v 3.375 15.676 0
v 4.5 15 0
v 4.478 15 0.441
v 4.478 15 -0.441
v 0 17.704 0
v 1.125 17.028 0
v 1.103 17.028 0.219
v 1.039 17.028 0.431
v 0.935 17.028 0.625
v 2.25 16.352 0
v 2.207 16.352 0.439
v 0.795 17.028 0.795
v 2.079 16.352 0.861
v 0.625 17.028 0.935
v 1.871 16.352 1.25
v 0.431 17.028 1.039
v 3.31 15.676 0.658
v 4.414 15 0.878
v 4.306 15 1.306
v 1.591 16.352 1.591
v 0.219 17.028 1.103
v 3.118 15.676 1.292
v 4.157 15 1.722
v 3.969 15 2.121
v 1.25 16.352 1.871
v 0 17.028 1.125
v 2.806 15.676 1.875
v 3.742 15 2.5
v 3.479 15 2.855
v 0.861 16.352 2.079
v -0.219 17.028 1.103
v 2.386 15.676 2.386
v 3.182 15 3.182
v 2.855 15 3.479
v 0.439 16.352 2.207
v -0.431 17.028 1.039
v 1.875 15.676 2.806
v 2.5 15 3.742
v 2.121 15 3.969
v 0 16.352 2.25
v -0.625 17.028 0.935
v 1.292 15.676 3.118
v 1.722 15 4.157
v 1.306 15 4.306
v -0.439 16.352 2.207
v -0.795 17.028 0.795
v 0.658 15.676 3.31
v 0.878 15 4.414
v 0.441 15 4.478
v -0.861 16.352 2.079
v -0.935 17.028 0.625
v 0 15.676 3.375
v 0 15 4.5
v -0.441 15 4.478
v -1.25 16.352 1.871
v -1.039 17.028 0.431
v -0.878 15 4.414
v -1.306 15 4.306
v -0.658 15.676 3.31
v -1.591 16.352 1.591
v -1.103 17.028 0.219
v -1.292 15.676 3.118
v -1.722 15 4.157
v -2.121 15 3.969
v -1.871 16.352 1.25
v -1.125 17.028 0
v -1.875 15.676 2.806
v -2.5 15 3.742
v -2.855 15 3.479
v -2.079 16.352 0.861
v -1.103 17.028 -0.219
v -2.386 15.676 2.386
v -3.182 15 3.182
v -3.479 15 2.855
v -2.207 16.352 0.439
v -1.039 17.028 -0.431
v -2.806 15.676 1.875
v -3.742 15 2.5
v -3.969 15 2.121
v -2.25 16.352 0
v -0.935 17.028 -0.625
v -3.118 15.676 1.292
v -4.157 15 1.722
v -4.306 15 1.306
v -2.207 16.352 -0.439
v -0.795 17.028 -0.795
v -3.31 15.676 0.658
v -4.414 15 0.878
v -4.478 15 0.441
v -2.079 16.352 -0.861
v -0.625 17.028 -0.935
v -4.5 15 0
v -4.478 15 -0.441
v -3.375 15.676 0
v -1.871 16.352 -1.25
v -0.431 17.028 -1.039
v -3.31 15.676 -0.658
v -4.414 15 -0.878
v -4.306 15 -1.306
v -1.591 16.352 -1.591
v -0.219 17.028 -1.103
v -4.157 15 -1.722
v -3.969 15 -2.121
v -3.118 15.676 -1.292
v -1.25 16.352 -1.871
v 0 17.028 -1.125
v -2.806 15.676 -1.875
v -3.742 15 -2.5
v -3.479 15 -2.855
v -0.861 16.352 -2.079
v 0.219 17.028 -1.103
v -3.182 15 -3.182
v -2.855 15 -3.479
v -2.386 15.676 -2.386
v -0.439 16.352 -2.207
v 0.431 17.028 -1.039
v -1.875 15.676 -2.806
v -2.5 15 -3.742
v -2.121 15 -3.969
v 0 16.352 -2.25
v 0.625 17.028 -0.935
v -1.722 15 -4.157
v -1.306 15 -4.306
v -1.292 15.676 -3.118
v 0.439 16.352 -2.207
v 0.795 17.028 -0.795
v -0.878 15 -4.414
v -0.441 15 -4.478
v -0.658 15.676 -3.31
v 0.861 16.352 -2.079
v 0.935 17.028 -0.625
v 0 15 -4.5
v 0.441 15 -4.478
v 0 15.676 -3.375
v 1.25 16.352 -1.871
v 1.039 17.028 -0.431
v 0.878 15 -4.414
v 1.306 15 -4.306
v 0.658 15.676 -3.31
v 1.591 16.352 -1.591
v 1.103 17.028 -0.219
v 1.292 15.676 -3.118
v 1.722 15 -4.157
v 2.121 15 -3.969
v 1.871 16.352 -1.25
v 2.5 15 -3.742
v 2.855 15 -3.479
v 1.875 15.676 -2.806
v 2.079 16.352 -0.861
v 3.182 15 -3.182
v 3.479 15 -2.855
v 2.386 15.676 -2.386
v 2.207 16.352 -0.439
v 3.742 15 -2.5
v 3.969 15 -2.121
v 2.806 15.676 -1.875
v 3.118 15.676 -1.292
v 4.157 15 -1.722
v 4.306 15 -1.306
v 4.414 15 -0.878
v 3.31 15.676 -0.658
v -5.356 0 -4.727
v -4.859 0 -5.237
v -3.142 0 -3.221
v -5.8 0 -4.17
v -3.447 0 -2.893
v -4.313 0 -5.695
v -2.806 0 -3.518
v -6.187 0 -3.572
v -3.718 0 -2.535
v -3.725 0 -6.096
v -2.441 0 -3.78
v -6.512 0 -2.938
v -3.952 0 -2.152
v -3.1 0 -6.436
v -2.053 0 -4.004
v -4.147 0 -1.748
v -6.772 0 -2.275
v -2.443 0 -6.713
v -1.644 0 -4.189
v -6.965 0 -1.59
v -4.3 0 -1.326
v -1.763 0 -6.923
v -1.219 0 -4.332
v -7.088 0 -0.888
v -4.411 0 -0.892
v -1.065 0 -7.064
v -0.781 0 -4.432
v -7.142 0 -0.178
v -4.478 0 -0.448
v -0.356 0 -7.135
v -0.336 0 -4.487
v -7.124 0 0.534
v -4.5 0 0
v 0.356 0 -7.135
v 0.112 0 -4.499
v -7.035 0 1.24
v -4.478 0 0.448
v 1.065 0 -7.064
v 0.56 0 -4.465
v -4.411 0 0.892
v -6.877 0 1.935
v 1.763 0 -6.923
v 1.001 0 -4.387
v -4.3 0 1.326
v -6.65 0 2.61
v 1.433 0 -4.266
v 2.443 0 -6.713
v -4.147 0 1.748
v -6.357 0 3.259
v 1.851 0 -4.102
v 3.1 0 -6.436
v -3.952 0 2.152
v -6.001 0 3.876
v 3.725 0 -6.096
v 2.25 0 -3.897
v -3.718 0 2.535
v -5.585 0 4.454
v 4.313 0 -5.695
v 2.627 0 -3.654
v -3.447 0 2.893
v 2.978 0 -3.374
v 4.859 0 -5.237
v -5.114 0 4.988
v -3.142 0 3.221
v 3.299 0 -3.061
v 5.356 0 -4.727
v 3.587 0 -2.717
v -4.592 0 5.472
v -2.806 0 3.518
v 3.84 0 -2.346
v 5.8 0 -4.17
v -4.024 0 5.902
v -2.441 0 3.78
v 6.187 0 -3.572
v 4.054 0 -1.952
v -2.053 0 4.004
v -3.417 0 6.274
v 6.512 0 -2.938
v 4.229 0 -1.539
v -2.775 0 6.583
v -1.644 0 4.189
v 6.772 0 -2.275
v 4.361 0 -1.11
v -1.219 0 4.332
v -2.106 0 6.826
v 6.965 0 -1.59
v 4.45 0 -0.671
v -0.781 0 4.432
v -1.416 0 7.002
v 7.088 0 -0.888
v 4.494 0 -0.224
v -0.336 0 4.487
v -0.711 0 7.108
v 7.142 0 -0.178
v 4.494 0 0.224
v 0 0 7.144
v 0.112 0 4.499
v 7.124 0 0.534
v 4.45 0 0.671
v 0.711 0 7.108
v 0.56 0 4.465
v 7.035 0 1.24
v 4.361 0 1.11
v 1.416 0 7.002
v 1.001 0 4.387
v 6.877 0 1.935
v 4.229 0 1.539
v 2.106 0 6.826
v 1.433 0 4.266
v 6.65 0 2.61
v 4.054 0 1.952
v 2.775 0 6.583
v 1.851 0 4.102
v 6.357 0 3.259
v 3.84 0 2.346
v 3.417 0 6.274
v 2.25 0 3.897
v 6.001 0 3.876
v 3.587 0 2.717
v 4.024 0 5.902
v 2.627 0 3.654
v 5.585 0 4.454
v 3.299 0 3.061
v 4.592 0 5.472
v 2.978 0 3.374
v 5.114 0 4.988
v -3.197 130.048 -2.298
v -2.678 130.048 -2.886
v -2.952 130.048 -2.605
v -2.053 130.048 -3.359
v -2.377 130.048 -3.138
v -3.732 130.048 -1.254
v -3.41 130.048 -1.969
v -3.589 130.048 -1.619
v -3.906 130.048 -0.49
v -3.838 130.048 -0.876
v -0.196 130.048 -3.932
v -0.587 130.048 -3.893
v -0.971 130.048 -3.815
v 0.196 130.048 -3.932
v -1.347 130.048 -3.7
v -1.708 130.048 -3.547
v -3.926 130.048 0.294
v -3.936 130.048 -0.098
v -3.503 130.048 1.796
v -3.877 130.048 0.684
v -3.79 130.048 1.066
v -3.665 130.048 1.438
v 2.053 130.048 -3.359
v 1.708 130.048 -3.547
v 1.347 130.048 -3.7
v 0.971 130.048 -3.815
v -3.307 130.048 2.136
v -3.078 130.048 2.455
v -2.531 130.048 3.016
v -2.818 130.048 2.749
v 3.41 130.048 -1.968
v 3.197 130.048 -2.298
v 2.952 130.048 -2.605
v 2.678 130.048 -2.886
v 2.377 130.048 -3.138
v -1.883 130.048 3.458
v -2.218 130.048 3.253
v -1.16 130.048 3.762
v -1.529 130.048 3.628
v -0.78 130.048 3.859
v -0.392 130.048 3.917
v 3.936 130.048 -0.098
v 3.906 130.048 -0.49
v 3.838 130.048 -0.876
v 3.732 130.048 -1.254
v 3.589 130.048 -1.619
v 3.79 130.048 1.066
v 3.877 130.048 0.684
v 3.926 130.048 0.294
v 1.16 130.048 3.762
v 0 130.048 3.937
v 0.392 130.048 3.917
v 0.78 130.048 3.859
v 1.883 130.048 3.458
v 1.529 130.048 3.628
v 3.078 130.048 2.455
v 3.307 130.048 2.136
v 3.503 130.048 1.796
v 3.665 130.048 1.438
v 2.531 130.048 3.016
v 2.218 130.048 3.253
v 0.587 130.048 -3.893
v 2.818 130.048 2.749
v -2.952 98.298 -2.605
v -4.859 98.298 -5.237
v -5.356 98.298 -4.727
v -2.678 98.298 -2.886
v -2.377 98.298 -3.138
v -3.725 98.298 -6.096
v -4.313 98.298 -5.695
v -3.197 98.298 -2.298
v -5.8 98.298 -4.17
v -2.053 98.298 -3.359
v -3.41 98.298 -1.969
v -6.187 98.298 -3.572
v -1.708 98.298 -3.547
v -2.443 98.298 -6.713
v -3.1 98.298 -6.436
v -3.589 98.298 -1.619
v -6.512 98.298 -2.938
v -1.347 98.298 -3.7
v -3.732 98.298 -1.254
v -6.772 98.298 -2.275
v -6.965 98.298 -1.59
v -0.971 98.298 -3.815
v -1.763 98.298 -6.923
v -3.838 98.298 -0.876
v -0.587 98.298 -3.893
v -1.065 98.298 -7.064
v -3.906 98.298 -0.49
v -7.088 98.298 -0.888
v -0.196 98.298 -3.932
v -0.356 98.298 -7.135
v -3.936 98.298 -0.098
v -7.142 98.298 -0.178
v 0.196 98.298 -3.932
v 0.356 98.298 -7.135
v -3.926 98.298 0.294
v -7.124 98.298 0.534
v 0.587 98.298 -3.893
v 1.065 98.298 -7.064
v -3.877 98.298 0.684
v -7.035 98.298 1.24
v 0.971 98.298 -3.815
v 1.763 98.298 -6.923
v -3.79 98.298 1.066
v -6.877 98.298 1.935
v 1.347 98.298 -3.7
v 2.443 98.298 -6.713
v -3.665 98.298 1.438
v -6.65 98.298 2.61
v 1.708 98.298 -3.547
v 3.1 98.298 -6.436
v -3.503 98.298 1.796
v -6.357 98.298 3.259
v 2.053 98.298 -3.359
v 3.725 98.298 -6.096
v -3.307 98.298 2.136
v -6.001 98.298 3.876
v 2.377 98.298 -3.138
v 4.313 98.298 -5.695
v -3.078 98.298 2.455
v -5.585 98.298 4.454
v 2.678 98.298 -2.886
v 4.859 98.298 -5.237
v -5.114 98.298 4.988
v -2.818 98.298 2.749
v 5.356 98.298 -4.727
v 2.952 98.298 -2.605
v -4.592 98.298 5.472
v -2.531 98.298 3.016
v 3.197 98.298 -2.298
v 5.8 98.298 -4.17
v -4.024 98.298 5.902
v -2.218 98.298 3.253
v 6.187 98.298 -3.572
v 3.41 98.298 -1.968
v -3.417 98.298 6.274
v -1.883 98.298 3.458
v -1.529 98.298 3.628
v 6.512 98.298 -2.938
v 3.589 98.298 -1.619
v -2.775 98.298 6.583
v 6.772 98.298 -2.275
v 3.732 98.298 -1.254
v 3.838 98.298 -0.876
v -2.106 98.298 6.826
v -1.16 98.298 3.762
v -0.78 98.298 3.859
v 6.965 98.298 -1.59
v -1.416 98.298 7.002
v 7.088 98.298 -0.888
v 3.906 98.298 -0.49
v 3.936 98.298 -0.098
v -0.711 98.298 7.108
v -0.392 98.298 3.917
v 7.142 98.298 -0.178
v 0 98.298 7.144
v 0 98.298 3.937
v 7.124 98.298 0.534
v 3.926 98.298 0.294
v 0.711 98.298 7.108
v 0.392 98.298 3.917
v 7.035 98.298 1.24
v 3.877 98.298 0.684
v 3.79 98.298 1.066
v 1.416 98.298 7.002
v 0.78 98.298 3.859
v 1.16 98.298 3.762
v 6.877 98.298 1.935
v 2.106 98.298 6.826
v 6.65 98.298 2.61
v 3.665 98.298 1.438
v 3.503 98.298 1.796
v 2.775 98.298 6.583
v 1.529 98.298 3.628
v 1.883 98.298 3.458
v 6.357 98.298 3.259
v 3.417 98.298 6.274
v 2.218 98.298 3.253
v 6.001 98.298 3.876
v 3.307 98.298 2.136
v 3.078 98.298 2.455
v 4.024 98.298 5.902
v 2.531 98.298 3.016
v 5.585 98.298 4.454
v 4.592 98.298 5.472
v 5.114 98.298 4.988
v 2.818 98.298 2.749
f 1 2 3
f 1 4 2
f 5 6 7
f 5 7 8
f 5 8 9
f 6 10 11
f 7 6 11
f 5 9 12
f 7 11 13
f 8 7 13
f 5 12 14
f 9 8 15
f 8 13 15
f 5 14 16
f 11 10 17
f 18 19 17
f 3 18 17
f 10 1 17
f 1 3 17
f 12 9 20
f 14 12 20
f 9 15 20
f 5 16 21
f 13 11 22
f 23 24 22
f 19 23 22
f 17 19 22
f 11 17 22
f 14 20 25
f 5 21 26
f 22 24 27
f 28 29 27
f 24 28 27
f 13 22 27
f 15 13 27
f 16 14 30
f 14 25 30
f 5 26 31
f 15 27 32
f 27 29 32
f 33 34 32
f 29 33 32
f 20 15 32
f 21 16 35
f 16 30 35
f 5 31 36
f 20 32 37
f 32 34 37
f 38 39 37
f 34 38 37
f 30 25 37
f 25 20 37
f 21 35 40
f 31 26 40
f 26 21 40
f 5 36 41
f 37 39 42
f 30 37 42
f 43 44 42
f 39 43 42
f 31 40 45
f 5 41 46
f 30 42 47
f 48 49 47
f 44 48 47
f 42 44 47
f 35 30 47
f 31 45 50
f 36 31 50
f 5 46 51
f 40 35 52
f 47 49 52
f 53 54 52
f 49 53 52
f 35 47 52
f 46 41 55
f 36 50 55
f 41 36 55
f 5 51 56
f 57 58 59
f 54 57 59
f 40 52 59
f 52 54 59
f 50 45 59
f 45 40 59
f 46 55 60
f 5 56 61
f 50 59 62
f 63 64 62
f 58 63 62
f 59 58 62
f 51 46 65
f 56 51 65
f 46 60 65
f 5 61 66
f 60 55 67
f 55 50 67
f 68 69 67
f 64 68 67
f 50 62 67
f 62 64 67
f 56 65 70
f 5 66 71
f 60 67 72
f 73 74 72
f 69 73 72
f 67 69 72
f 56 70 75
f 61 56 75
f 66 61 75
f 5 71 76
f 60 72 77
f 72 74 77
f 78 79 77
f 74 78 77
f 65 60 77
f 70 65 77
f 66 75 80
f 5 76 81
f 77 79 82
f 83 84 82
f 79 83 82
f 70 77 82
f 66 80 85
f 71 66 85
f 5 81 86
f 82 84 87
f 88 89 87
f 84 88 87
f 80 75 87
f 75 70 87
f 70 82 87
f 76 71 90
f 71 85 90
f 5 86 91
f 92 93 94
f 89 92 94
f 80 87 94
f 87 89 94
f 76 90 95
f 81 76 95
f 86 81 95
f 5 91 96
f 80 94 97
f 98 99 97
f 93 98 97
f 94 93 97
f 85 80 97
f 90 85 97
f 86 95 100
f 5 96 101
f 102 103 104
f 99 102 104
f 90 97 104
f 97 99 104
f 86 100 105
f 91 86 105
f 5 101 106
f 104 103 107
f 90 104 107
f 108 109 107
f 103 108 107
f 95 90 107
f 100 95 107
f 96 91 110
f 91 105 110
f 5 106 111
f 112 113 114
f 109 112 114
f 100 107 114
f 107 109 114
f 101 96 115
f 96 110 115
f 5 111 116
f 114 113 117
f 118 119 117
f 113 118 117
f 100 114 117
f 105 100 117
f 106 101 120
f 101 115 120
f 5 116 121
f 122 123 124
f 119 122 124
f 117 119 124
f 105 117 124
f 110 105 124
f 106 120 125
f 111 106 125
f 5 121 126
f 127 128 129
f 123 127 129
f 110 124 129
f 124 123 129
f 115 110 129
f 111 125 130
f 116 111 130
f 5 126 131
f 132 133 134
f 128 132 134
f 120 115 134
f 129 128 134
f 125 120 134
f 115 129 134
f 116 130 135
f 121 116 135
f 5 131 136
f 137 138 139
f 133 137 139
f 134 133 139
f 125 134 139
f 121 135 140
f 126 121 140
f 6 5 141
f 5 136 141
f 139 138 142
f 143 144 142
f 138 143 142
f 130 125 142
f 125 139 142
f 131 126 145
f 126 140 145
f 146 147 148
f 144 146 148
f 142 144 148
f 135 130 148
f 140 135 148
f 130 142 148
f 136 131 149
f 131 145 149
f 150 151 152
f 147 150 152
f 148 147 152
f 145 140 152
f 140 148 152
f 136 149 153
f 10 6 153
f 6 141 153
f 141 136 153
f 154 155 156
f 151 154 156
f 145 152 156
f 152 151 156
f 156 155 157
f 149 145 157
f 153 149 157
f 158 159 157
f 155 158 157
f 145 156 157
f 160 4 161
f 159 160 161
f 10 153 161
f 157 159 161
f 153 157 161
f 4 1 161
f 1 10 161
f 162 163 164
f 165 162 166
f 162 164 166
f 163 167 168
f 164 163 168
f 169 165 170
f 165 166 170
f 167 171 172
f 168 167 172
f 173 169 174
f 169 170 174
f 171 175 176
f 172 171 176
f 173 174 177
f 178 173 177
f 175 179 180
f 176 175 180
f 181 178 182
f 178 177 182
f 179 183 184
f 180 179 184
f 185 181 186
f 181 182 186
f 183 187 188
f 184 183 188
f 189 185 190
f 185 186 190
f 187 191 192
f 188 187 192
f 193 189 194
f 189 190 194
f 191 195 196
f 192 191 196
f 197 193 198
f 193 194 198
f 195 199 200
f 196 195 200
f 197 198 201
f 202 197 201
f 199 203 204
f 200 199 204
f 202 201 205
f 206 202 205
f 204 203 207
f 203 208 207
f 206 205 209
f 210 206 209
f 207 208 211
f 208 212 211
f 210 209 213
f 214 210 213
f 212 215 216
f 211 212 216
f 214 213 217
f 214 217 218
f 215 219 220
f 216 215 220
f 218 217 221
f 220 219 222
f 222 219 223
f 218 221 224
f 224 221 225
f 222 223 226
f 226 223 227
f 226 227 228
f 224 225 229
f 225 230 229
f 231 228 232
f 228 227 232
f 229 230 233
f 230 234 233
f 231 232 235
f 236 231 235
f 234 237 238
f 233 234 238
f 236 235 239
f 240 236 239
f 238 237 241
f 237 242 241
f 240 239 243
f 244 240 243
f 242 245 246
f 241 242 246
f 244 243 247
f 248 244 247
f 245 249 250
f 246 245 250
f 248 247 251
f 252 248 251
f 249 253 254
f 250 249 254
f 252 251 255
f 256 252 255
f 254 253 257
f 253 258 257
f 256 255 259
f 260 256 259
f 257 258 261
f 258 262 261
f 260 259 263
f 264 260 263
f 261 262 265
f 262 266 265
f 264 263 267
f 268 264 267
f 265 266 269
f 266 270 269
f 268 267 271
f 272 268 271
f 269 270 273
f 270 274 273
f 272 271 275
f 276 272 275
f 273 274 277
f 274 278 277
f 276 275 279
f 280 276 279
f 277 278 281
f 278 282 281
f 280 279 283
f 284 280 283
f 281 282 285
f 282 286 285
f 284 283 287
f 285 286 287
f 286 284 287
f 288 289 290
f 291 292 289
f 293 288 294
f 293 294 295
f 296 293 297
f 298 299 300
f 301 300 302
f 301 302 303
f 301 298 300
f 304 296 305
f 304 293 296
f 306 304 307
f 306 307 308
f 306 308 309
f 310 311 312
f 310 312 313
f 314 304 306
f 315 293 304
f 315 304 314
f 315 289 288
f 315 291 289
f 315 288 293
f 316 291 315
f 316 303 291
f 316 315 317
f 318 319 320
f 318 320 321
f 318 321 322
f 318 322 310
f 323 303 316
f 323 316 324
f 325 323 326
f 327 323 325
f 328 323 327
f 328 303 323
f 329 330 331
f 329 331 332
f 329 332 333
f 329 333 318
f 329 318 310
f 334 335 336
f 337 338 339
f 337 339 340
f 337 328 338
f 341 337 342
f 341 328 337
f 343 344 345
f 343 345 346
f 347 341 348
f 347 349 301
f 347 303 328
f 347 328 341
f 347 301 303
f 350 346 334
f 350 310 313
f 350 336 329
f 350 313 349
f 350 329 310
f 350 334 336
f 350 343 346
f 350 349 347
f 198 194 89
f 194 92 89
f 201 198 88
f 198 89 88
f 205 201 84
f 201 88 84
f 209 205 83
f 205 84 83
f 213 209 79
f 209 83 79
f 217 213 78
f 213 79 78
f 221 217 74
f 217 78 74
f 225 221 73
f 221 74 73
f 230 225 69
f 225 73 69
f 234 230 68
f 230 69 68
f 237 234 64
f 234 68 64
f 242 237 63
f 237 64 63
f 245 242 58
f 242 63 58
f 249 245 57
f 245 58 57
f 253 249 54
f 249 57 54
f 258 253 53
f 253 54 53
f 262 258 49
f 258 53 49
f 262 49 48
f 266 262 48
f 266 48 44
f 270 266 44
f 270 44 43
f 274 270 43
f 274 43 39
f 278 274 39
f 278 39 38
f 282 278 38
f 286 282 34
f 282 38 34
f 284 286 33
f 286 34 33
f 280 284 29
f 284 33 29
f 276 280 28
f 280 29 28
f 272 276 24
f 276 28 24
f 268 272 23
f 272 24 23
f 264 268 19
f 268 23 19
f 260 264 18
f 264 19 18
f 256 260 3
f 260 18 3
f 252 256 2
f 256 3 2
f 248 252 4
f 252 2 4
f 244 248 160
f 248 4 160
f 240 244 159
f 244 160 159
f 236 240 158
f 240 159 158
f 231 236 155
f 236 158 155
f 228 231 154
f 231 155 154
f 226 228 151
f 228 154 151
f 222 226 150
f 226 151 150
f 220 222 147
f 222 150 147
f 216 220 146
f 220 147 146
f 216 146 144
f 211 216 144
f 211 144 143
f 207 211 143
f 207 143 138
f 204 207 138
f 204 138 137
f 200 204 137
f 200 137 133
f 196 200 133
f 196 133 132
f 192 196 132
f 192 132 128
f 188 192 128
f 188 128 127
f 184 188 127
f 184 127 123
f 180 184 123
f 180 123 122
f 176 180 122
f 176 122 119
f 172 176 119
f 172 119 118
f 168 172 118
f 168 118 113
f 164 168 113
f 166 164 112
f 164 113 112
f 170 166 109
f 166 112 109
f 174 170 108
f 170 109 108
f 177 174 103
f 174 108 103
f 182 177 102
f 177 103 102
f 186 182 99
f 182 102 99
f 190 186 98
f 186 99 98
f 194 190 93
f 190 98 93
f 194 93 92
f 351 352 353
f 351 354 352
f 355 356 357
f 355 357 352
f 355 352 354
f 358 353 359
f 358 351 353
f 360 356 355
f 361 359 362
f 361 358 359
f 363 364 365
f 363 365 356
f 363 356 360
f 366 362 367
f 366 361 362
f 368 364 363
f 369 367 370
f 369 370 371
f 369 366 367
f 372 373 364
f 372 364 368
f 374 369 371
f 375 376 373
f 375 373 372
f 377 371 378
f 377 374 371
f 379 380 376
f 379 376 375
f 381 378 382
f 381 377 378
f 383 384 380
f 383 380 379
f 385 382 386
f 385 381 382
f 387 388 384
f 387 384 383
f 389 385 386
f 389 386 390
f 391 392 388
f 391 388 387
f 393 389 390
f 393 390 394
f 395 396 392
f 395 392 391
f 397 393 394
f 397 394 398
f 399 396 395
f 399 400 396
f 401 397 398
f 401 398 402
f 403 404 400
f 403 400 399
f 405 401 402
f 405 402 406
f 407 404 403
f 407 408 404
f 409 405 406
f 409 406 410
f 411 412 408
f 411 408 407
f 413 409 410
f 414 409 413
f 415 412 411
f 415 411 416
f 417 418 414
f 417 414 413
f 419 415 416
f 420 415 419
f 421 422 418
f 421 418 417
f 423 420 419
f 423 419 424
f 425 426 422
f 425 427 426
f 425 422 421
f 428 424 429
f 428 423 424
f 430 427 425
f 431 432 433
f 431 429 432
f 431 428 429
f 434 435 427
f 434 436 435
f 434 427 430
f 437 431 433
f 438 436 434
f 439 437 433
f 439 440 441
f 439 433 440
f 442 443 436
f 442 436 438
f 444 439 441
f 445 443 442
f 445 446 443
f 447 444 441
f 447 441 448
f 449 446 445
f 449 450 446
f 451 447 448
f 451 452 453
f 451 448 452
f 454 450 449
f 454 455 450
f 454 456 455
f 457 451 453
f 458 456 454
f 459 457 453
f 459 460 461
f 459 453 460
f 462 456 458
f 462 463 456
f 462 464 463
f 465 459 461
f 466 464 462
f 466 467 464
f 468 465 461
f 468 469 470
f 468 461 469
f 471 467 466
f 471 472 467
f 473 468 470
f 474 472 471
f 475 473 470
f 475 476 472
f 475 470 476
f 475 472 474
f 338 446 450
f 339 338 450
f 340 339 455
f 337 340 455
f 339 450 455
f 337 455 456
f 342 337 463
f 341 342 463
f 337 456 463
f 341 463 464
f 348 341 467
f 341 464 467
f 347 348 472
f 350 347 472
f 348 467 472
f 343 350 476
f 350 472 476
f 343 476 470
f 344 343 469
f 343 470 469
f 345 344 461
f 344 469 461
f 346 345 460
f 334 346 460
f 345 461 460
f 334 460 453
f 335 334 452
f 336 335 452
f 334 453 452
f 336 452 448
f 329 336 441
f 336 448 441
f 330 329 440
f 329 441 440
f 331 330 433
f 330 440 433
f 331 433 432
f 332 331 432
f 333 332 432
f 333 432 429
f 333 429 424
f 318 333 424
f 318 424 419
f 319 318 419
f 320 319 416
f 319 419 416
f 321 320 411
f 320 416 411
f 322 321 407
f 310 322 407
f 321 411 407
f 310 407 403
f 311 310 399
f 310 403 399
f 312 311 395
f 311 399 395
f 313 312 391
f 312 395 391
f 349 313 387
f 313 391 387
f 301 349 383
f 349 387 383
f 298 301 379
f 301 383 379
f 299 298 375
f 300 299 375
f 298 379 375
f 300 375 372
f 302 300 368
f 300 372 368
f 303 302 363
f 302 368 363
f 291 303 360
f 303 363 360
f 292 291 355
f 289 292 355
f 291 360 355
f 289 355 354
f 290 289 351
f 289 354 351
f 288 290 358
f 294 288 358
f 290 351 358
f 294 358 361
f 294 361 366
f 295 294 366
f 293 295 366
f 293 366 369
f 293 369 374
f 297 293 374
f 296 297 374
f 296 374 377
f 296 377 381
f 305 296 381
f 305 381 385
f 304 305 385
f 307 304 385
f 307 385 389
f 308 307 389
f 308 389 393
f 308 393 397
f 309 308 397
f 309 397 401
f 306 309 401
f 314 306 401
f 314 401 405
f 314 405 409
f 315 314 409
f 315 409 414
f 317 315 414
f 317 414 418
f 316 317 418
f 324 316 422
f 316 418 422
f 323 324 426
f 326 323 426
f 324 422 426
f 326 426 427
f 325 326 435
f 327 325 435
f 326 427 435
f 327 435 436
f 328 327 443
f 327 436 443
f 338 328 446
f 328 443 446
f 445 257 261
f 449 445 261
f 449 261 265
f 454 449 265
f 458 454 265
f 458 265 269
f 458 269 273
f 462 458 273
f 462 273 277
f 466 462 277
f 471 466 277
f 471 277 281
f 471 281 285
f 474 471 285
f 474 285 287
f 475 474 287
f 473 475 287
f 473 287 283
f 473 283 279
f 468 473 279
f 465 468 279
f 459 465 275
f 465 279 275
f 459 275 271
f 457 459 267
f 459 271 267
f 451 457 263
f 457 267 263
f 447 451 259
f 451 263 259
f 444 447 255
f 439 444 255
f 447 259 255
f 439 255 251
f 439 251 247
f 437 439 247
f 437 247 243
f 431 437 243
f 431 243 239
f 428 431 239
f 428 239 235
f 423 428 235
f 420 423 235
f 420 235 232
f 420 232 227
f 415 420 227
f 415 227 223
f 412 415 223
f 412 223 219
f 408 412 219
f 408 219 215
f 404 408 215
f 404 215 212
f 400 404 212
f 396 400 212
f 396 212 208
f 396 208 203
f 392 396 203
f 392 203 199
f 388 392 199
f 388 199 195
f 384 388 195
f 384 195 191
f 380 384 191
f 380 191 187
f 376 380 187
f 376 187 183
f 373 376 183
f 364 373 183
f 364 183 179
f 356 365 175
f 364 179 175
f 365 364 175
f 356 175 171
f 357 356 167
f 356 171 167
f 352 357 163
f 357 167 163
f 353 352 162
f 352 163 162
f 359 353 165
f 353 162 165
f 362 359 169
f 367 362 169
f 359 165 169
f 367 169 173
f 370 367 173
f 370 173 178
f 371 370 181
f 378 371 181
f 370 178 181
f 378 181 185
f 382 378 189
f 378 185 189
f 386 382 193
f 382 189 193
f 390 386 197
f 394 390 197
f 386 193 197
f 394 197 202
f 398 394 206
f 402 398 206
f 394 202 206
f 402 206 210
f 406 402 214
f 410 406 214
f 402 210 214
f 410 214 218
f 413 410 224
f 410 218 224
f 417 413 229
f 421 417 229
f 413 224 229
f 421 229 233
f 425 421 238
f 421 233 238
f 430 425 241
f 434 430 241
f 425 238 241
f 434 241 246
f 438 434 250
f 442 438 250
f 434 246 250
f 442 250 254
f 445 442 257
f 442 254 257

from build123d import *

# Parameters (mm, degrees)
SKETCH1_R                  = 7.14375
BOSS_EXTRUDE1_DEPTH        = 130.048
M10X1_0_TAPPED_HOLE1_D     = 9
M10X1_0_TAPPED_HOLE1_DEPTH = 15
M10X1_0_TAPPED_HOLE1_TIP   = 2.703872786
CUT_EXTRUDE1_START         = -31.75
SKETCH4_R                  = 7.14375
SKETCH4_R_2                = 3.937
CUT_EXTRUDE1_DEPTH         = 31.75


with BuildPart() as part:
    # Sketch1 → Boss-Extrude1 (new body)
    with BuildSketch(Plane(origin=(0, 0, 0), x_dir=(1, 0, 0), z_dir=(0, 1, 0))):
        with Locations(Location((0, 0, 0), (0, 0, 270))):
            Circle(SKETCH1_R)
    extrude(amount=BOSS_EXTRUDE1_DEPTH)

    # M10x1.0 Tapped Hole1
    with Locations(Plane.XZ):
        with Locations((0, 0)):
            Hole(M10X1_0_TAPPED_HOLE1_D / 2, depth=M10X1_0_TAPPED_HOLE1_DEPTH)
            with Locations((0, 0, -(M10X1_0_TAPPED_HOLE1_DEPTH + M10X1_0_TAPPED_HOLE1_TIP / 2))):  # 118° drill point
                Cone(0, M10X1_0_TAPPED_HOLE1_D / 2, M10X1_0_TAPPED_HOLE1_TIP, mode=Mode.SUBTRACT)

    # Sketch4 → Cut-Extrude1 (cut)
    with BuildSketch(Plane(origin=(0, 130.048, 0), x_dir=(1, 0, 0), z_dir=(0, 1, 0)).offset(CUT_EXTRUDE1_START)):
        with Locations(Location((0, 0, 0), (0, 0, 270))):
            Circle(SKETCH4_R)
        with Locations(Location((0, 0, 0), (0, 0, 270))):
            Circle(SKETCH4_R_2, mode=Mode.SUBTRACT)
    extrude(amount=CUT_EXTRUDE1_DEPTH, mode=Mode.SUBTRACT)


solid = part.part
